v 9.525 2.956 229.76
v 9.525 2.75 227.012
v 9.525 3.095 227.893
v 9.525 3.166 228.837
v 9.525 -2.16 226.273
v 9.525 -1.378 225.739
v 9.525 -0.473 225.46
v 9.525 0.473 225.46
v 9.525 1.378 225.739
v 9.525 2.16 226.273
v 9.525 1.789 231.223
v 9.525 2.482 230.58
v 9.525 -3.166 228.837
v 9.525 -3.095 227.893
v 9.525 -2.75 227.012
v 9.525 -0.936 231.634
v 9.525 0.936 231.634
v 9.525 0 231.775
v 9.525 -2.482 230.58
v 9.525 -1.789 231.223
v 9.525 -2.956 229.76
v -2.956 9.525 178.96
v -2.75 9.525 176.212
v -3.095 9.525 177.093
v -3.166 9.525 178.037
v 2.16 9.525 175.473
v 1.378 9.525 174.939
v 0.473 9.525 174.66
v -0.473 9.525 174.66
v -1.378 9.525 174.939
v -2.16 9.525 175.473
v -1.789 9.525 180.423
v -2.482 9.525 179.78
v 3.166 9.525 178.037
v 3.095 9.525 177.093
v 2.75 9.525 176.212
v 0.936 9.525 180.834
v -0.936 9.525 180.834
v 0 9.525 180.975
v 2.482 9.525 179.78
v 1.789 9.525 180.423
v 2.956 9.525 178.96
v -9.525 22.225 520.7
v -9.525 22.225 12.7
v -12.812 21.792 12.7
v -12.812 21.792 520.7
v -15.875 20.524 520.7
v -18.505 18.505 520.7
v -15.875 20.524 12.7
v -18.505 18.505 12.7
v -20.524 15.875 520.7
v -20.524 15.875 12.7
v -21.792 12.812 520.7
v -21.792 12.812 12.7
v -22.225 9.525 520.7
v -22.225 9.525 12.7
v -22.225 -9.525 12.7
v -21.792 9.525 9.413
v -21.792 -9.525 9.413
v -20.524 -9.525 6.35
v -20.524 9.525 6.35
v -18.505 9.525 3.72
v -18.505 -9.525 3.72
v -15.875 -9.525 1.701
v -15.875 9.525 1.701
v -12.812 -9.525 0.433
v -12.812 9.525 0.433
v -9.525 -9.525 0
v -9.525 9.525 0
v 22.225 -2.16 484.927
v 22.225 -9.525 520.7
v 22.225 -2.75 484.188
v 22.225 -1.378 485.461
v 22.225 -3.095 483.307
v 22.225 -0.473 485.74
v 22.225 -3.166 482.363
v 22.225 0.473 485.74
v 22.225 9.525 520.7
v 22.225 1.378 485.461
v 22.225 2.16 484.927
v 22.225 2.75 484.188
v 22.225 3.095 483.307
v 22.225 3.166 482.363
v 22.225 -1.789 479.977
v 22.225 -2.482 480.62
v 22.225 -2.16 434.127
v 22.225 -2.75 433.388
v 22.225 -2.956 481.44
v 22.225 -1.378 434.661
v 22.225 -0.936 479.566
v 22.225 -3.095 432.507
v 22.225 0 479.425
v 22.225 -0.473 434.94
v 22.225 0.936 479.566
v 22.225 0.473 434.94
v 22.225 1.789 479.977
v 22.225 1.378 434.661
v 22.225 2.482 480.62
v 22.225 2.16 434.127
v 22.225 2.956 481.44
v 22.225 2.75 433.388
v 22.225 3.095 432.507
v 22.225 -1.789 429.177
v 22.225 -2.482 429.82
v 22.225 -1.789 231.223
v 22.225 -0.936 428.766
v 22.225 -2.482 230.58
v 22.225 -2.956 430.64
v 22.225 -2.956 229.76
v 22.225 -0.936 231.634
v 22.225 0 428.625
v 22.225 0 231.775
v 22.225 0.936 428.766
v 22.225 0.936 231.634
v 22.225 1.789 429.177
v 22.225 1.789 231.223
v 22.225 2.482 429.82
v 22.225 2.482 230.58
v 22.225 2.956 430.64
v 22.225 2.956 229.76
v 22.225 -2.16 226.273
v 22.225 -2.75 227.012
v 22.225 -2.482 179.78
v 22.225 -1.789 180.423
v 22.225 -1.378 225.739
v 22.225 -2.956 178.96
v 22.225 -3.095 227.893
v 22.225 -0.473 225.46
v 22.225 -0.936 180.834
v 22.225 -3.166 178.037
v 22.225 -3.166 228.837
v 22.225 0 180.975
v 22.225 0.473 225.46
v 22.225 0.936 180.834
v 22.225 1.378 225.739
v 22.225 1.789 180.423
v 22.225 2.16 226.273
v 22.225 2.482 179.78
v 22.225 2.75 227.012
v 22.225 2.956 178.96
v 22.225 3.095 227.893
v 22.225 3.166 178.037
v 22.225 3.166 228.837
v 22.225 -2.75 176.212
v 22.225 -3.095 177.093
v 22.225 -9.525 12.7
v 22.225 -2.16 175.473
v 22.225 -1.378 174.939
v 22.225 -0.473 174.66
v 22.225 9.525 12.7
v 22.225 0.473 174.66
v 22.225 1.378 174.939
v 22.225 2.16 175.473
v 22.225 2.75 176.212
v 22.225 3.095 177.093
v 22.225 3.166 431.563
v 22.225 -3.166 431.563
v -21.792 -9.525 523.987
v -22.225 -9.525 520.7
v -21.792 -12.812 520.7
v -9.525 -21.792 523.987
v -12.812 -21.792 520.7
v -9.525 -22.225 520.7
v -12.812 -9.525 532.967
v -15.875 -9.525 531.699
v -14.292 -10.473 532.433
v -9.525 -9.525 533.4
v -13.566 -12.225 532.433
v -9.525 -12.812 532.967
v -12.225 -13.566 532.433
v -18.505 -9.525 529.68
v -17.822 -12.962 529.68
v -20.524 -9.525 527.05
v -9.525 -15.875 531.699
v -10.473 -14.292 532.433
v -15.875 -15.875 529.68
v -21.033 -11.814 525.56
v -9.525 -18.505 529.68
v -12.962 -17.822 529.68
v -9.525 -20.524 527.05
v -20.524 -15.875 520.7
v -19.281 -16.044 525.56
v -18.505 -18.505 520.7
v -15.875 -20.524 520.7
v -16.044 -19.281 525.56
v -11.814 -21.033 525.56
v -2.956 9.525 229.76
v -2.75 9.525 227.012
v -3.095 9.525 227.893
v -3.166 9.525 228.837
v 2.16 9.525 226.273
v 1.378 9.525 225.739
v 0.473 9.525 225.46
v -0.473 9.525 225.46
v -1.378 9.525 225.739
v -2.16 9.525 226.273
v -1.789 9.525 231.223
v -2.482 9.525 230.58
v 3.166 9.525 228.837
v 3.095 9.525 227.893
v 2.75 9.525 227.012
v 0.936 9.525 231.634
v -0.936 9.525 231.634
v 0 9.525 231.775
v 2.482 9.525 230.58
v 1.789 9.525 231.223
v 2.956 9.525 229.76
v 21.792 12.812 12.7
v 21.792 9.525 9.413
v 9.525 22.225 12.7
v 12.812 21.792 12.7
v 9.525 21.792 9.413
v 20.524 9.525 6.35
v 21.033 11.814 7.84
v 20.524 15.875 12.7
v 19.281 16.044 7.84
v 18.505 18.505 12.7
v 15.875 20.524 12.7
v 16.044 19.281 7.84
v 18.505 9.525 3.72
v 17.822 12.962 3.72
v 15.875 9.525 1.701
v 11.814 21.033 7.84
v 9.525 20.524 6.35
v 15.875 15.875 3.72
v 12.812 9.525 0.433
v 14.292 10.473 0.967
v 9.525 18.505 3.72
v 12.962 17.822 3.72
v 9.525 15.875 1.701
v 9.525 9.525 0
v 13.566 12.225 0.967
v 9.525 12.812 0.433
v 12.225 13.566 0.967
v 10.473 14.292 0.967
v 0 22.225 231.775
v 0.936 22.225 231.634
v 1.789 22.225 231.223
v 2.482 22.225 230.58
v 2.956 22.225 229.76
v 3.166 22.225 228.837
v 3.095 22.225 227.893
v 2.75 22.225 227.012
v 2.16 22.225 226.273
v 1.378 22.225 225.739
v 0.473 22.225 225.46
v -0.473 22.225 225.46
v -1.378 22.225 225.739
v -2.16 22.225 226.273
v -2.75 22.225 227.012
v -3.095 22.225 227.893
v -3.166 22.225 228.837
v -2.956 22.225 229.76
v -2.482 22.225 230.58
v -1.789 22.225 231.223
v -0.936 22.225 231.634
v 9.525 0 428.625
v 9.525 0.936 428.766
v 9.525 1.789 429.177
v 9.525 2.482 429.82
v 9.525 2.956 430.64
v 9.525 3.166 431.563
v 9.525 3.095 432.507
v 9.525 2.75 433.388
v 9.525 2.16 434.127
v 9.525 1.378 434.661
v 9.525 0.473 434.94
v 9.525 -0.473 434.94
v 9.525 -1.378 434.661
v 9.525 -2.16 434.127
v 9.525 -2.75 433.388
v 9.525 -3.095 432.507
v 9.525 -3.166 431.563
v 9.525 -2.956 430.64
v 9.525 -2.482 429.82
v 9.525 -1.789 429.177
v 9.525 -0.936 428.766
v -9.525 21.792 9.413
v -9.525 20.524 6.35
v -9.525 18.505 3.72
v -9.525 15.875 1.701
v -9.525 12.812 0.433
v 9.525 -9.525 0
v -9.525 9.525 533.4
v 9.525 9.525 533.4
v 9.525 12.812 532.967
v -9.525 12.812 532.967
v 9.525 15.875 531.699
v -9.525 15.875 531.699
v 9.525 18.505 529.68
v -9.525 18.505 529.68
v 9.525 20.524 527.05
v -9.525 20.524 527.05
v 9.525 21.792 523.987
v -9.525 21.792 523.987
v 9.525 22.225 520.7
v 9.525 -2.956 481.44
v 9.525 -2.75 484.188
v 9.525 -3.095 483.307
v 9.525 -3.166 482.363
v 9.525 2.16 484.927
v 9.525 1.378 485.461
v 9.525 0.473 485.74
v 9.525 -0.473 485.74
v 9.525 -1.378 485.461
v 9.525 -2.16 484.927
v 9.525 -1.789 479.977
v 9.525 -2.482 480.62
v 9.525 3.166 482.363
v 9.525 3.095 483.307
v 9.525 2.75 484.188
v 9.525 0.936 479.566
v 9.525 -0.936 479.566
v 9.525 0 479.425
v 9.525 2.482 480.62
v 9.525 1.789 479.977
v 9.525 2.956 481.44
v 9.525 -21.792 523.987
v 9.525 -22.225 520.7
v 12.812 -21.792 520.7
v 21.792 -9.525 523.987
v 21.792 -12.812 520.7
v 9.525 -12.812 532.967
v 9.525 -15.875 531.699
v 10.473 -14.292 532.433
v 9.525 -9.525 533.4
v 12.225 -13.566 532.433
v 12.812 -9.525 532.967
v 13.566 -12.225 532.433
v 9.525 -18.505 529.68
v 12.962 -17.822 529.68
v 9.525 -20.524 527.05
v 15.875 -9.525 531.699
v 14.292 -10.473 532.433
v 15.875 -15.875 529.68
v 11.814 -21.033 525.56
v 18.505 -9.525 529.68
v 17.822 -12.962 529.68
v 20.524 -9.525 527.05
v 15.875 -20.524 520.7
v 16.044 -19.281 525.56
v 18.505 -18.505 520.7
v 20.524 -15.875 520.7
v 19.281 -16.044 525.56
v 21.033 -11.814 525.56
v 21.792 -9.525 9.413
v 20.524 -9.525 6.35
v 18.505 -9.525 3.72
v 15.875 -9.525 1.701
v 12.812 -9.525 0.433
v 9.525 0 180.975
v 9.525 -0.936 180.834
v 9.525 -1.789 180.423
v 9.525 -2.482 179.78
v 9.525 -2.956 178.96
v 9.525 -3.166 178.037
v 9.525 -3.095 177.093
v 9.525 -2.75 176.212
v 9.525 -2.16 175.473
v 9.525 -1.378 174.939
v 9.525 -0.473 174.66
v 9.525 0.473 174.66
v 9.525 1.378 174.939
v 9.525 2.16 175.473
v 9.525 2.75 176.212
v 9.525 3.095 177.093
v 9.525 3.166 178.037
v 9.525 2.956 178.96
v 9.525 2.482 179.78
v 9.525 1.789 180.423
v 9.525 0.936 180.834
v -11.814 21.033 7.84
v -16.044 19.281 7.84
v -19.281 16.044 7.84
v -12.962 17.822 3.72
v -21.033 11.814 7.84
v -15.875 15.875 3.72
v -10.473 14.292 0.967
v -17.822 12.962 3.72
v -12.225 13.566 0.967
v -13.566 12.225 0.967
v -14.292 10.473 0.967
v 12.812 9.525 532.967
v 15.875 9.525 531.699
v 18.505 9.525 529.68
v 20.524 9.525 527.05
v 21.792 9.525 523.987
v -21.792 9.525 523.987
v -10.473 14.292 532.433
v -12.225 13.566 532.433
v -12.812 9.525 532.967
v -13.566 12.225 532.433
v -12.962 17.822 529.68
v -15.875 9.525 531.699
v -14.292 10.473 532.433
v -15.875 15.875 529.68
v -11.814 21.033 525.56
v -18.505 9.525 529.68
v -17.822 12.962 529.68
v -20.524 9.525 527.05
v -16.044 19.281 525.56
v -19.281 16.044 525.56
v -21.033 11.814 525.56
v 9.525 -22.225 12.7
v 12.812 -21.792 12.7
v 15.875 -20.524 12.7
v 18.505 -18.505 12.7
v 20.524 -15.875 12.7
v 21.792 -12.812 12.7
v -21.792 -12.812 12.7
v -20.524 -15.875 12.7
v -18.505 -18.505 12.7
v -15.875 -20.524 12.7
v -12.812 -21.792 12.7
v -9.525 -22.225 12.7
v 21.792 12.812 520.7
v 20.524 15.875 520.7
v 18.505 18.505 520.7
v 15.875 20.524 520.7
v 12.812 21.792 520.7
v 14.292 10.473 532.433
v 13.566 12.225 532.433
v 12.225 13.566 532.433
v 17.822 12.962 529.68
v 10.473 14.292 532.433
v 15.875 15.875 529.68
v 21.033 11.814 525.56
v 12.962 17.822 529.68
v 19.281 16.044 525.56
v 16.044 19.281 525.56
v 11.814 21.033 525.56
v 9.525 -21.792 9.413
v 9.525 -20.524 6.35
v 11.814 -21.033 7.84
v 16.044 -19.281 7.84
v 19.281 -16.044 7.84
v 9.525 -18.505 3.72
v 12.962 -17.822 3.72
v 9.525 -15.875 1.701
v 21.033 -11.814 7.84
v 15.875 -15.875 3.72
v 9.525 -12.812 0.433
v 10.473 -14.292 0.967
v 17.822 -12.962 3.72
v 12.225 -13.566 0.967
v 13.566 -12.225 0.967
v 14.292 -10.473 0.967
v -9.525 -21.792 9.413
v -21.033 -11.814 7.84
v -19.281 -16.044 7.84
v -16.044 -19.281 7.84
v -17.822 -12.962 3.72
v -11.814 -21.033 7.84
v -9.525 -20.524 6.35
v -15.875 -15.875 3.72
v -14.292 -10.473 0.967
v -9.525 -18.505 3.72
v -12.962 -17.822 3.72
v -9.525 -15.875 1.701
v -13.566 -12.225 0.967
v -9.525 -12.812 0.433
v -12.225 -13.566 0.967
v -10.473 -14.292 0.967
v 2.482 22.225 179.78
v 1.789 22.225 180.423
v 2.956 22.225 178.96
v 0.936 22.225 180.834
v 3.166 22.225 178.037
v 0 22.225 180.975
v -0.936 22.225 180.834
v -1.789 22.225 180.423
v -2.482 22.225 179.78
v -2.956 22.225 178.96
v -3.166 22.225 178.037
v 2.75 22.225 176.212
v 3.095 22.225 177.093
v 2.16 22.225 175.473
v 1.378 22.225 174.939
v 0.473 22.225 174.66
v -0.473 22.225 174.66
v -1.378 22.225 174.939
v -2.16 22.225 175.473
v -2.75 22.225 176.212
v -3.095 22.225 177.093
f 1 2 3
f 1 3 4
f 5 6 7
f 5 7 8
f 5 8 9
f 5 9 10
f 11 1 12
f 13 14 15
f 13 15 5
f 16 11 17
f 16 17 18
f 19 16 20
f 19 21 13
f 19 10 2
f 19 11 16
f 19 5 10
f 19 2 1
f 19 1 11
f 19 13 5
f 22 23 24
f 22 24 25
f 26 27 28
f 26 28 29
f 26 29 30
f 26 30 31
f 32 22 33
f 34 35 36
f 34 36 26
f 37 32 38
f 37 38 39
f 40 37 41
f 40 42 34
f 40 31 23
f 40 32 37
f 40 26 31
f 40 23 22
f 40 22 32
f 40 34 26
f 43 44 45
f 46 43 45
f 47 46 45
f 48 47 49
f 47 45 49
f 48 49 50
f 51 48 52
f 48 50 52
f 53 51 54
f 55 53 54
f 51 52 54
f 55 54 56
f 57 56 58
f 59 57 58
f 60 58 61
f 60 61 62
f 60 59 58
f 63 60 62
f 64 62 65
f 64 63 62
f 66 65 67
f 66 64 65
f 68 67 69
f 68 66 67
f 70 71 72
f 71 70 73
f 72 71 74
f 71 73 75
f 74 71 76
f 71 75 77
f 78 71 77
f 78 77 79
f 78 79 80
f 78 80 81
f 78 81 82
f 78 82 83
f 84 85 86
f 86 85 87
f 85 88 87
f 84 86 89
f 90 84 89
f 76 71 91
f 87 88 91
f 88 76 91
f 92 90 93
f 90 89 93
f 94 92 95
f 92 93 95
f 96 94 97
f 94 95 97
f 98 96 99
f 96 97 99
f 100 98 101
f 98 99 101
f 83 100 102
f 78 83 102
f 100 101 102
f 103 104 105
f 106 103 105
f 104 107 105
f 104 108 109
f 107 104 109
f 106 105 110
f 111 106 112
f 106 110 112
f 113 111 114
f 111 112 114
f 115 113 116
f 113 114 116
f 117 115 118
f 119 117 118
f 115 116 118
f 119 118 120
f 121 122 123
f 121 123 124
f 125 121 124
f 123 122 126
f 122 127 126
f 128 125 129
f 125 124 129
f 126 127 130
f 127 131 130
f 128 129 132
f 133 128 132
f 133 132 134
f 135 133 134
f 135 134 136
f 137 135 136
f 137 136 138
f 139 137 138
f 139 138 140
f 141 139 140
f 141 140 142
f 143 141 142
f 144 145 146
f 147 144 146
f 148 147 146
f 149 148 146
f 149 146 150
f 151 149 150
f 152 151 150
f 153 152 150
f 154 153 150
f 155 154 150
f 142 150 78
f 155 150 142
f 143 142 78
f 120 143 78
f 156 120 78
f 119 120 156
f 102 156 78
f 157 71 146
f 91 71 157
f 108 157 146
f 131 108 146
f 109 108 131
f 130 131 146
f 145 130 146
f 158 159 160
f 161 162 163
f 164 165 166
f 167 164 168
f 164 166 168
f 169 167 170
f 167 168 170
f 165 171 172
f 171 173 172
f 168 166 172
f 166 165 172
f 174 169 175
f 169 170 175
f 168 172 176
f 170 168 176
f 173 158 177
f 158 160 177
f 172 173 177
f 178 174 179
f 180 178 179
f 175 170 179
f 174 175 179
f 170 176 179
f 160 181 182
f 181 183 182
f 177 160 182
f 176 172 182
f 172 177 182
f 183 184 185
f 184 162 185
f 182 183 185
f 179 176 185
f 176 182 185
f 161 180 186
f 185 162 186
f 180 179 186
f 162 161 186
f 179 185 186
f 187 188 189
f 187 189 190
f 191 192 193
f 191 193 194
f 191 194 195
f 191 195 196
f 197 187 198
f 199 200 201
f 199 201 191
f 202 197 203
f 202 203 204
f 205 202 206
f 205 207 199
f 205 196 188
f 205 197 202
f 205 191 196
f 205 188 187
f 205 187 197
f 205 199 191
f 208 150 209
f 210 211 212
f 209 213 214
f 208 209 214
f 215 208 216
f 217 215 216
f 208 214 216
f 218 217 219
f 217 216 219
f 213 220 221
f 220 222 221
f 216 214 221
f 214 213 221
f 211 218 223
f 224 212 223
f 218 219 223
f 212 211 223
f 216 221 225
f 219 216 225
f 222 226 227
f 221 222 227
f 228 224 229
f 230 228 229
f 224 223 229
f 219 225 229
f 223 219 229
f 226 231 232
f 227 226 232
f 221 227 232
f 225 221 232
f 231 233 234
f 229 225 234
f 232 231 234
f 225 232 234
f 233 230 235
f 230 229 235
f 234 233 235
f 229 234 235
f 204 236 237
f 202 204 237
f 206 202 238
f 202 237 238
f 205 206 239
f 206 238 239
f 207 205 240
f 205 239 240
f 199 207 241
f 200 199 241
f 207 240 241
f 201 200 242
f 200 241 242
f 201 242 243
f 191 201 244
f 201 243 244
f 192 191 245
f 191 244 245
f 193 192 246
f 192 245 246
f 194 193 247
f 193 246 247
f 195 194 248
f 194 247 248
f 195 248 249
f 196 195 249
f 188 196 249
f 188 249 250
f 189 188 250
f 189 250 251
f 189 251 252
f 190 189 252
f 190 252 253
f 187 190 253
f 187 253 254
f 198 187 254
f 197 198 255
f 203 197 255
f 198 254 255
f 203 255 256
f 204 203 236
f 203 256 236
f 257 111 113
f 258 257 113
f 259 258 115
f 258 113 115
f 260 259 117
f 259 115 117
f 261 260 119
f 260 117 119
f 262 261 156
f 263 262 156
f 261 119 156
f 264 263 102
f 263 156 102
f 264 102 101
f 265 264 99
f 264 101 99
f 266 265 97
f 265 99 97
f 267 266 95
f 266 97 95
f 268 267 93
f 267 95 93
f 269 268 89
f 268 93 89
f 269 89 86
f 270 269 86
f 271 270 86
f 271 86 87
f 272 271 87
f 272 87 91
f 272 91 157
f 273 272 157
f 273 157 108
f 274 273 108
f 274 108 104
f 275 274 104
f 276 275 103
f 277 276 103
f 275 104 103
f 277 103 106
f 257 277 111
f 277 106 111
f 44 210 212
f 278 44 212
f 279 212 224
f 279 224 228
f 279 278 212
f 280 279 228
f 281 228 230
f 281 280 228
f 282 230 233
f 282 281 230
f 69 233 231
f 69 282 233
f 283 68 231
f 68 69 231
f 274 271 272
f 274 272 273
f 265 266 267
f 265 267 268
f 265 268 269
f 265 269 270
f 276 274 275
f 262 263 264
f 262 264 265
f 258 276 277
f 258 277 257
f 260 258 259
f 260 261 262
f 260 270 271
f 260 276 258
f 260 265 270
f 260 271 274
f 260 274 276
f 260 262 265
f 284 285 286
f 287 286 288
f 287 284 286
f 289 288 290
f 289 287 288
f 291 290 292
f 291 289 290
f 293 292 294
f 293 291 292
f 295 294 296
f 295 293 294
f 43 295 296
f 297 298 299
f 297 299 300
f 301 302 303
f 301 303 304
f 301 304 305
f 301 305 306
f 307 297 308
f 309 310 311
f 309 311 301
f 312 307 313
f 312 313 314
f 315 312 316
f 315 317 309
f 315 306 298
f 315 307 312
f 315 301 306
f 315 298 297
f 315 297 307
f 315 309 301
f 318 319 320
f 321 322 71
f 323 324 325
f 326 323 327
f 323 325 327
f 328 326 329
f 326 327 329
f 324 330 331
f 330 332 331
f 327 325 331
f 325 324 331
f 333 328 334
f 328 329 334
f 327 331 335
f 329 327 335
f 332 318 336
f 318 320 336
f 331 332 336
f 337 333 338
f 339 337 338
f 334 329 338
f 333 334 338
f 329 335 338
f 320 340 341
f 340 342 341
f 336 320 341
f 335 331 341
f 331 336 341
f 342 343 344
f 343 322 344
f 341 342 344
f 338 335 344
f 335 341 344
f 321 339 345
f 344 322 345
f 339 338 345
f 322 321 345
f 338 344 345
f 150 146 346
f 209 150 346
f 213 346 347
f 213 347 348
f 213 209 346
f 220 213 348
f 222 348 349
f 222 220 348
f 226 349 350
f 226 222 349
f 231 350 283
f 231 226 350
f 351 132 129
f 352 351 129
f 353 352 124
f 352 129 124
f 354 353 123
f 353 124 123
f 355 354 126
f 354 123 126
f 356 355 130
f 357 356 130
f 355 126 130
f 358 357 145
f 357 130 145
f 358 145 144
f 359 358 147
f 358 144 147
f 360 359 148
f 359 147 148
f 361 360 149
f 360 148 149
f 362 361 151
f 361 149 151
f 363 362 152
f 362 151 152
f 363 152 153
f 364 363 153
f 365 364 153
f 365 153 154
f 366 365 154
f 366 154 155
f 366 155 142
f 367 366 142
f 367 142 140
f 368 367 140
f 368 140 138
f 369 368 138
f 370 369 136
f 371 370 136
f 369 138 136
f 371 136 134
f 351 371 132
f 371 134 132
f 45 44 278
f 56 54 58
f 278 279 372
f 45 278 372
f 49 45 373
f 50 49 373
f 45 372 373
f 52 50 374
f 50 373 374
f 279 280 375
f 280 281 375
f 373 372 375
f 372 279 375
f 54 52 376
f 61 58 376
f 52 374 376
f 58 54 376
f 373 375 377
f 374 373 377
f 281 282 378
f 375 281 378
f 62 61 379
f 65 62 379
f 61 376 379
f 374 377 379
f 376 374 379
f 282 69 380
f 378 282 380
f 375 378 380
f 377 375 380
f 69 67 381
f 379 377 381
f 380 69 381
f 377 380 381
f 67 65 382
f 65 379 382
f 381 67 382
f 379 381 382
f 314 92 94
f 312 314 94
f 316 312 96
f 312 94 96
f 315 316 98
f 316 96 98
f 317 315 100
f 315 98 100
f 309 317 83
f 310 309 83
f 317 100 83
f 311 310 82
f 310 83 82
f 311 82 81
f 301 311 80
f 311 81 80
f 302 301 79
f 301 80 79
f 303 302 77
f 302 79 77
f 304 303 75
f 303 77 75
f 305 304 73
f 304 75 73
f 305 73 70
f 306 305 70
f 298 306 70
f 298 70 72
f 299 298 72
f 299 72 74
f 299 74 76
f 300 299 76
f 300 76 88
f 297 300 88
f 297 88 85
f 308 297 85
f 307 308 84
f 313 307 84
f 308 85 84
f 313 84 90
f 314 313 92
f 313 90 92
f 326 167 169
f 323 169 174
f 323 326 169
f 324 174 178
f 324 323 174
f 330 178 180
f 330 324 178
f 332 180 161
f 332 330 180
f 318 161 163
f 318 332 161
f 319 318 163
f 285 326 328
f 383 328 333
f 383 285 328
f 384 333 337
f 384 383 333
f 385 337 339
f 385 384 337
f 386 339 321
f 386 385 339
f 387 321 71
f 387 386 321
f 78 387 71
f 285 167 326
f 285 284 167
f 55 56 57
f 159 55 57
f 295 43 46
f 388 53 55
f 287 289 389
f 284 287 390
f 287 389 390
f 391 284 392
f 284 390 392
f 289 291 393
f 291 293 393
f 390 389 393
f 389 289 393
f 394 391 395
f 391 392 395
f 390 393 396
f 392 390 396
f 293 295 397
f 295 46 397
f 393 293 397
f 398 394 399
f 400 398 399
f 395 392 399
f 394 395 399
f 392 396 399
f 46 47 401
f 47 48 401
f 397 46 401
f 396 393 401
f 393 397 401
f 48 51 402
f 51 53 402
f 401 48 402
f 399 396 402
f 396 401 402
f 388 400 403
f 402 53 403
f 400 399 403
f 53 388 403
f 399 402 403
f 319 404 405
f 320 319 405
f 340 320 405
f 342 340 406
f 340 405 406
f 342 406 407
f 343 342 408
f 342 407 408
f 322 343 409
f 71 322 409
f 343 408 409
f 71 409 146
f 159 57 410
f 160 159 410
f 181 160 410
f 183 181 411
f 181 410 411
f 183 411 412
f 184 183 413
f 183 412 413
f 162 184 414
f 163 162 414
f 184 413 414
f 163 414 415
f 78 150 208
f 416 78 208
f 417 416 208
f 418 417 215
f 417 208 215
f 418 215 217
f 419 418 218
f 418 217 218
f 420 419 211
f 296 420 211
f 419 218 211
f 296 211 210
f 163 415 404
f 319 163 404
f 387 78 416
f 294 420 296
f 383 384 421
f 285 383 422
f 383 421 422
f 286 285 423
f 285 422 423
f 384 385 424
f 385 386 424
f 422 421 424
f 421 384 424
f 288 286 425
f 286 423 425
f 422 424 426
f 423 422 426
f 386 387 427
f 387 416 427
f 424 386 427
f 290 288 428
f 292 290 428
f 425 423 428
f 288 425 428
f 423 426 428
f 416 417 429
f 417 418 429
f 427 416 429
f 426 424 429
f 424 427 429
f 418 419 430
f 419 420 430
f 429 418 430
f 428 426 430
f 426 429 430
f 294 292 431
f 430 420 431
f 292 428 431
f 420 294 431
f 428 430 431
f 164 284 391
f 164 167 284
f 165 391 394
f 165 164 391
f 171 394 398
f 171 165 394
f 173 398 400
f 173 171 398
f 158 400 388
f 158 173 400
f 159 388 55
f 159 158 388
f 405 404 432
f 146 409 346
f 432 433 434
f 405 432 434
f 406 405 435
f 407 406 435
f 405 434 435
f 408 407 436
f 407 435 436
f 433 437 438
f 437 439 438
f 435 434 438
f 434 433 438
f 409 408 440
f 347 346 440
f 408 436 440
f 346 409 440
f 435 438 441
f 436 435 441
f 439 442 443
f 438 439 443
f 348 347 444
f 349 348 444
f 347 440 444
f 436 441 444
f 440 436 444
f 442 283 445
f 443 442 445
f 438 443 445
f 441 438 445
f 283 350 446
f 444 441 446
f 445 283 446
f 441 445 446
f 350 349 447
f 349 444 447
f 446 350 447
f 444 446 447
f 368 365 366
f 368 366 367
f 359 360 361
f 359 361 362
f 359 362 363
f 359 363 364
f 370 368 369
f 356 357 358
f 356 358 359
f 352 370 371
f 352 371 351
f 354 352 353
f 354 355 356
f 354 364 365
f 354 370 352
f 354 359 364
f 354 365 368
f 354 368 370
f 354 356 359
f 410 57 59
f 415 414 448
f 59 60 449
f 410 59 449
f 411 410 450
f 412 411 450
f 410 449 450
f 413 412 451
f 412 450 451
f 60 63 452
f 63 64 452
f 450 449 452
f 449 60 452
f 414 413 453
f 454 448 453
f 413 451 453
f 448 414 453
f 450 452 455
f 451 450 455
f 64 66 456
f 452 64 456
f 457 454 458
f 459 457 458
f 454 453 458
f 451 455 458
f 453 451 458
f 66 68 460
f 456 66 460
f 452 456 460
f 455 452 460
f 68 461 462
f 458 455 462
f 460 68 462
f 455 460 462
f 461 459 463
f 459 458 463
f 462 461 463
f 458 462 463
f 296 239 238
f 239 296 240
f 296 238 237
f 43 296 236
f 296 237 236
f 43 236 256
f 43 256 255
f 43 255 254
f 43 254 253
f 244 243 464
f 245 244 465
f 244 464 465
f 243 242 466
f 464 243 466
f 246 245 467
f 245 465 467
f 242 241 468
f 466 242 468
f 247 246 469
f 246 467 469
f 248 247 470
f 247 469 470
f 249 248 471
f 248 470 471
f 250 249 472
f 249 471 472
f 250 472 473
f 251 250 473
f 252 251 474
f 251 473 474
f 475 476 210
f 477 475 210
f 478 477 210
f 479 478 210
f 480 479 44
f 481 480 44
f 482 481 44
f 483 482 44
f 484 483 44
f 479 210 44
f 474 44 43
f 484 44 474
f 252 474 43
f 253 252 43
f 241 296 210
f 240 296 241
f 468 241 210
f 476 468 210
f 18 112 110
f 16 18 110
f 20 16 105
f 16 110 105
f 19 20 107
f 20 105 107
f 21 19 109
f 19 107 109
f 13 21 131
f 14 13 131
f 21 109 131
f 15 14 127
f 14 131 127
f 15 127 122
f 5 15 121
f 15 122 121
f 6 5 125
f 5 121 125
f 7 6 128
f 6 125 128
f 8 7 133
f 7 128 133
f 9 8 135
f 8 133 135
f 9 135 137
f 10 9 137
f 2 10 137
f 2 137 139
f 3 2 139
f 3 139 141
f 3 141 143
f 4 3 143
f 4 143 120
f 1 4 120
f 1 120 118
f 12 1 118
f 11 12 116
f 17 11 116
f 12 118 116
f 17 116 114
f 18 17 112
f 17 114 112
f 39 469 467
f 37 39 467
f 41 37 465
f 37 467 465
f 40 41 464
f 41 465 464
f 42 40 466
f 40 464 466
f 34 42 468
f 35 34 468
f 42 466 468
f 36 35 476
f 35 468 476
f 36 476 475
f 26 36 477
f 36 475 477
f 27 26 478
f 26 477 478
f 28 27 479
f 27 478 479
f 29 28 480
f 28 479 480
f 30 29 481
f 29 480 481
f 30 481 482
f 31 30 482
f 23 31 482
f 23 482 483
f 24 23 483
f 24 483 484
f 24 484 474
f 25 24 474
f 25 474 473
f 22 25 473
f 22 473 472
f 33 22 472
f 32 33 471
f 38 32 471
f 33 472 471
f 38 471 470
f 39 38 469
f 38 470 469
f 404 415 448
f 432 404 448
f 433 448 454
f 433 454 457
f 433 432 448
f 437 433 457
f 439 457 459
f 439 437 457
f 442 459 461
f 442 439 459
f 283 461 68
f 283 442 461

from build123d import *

# Parameters (mm, degrees)
BOSS_EXTRUDE1_DEPTH = 254
FILLET1_R           = 12.7
SKETCH2_R           = 3.175
CUT_EXTRUDE1_DEPTH  = 12.7
CIRPATTERN2_COUNT   = 2
CIRPATTERN2_ANGLE   = 90
BOSS_EXTRUDE2_DEPTH = 279.4
FILLET2_R           = 12.7
SKETCH5_R           = 3.175
CUT_EXTRUDE2_DEPTH  = 12.7


with BuildPart() as part:
    # Sketch1 → Boss-Extrude1 (new body)
    with BuildSketch(Plane.XY):
        with BuildLine():
            Line((-9.525, -22.225), (9.525, -22.225))
            ThreePointArc((9.525, -22.225), (18.505256121, -18.505256121), (22.225, -9.525))
            Line((22.225, -9.525), (22.225, 9.525))
            ThreePointArc((22.225, 9.525), (18.505256121, 18.505256121), (9.525, 22.225))
            Line((9.525, 22.225), (-9.525, 22.225))
            ThreePointArc((-9.525, 22.225), (-18.505256121, 18.505256121), (-22.225, 9.525))
            Line((-22.225, 9.525), (-22.225, -9.525))
            ThreePointArc((-22.225, -9.525), (-18.505256121, -18.505256121), (-9.525, -22.225))
        make_face()
    extrude(amount=BOSS_EXTRUDE1_DEPTH)

    # Fillet1
    fillet1_edges = [part.edges().sort_by_distance(p)[0] for p in [
        (0, -22.225, 0),
        (-18.505256121, -18.505256121, 0),
        (-22.225, 0, 0),
        (-18.505256121, 18.505256121, 0),
        (0, 22.225, 0),
        (18.505256121, 18.505256121, 0),
        (22.225, 0, 0),
        (18.505256121, -18.505256121, 0),
    ]]
    fillet(fillet1_edges, radius=FILLET1_R)

    # Sketch2 → Cut-Extrude1 (cut)
    with BuildSketch(Plane(origin=(0, 22.225, 0), x_dir=(1, 0, 0), z_dir=(0, 1, 0))):
        with Locations(Location((0, -177.8, 0), (0, 0, 270))):  # turned: the seam where the file's is
            Circle(SKETCH2_R)
        with Locations(Location((0, -228.6, 0), (0, 0, 270))):  # turned: the seam where the file's is
            Circle(SKETCH2_R)
    cut_extrude1 = extrude(amount=-CUT_EXTRUDE1_DEPTH, mode=Mode.SUBTRACT)

    # CirPattern2: Cut-Extrude1 ×2 about axis
    cirpattern2_axis = Axis((0, 0, 1052.131449431), (0, 0, -1))
    for i in range(1, CIRPATTERN2_COUNT):
        add(cut_extrude1.rotate(cirpattern2_axis, i * CIRPATTERN2_ANGLE / (CIRPATTERN2_COUNT - 1)), mode=Mode.SUBTRACT)

    # Sketch4 → Boss-Extrude2 (add)
    with BuildSketch(Plane.XY.offset(254)):
        with BuildLine():
            Line((-9.525, -22.225), (9.525, -22.225))
            ThreePointArc((9.525, -22.225), (18.505256121, -18.505256121), (22.225, -9.525))
            Line((22.225, -9.525), (22.225, 9.525))
            ThreePointArc((22.225, 9.525), (18.505256121, 18.505256121), (9.525, 22.225))
            Line((9.525, 22.225), (-9.525, 22.225))
            ThreePointArc((-9.525, 22.225), (-18.505256121, 18.505256121), (-22.225, 9.525))
            Line((-22.225, 9.525), (-22.225, -9.525))
            ThreePointArc((-22.225, -9.525), (-18.505256121, -18.505256121), (-9.525, -22.225))
        make_face()
    extrude(amount=BOSS_EXTRUDE2_DEPTH)

    # Fillet2
    fillet2_edges = [part.edges().sort_by_distance(p)[0] for p in [
        (-18.505256121, -18.505256121, 533.4),
        (0, -22.225, 533.4),
        (18.505256121, -18.505256121, 533.4),
        (22.225, 0, 533.4),
        (18.505256121, 18.505256121, 533.4),
        (0, 22.225, 533.4),
        (-18.505256121, 18.505256121, 533.4),
        (-22.225, 0, 533.4),
    ]]
    fillet(fillet2_edges, radius=FILLET2_R)

    # Sketch5 → Cut-Extrude2 (cut)
    with BuildSketch(Plane(origin=(22.225, 0, 0), x_dir=(0, 0, -1), z_dir=(1, 0, 0))):
        with Locations((-431.8, 0)):
            Circle(SKETCH5_R)
        with Locations((-482.6, 0)):
            Circle(SKETCH5_R)
    extrude(amount=-CUT_EXTRUDE2_DEPTH, mode=Mode.SUBTRACT)


solid = part.part
